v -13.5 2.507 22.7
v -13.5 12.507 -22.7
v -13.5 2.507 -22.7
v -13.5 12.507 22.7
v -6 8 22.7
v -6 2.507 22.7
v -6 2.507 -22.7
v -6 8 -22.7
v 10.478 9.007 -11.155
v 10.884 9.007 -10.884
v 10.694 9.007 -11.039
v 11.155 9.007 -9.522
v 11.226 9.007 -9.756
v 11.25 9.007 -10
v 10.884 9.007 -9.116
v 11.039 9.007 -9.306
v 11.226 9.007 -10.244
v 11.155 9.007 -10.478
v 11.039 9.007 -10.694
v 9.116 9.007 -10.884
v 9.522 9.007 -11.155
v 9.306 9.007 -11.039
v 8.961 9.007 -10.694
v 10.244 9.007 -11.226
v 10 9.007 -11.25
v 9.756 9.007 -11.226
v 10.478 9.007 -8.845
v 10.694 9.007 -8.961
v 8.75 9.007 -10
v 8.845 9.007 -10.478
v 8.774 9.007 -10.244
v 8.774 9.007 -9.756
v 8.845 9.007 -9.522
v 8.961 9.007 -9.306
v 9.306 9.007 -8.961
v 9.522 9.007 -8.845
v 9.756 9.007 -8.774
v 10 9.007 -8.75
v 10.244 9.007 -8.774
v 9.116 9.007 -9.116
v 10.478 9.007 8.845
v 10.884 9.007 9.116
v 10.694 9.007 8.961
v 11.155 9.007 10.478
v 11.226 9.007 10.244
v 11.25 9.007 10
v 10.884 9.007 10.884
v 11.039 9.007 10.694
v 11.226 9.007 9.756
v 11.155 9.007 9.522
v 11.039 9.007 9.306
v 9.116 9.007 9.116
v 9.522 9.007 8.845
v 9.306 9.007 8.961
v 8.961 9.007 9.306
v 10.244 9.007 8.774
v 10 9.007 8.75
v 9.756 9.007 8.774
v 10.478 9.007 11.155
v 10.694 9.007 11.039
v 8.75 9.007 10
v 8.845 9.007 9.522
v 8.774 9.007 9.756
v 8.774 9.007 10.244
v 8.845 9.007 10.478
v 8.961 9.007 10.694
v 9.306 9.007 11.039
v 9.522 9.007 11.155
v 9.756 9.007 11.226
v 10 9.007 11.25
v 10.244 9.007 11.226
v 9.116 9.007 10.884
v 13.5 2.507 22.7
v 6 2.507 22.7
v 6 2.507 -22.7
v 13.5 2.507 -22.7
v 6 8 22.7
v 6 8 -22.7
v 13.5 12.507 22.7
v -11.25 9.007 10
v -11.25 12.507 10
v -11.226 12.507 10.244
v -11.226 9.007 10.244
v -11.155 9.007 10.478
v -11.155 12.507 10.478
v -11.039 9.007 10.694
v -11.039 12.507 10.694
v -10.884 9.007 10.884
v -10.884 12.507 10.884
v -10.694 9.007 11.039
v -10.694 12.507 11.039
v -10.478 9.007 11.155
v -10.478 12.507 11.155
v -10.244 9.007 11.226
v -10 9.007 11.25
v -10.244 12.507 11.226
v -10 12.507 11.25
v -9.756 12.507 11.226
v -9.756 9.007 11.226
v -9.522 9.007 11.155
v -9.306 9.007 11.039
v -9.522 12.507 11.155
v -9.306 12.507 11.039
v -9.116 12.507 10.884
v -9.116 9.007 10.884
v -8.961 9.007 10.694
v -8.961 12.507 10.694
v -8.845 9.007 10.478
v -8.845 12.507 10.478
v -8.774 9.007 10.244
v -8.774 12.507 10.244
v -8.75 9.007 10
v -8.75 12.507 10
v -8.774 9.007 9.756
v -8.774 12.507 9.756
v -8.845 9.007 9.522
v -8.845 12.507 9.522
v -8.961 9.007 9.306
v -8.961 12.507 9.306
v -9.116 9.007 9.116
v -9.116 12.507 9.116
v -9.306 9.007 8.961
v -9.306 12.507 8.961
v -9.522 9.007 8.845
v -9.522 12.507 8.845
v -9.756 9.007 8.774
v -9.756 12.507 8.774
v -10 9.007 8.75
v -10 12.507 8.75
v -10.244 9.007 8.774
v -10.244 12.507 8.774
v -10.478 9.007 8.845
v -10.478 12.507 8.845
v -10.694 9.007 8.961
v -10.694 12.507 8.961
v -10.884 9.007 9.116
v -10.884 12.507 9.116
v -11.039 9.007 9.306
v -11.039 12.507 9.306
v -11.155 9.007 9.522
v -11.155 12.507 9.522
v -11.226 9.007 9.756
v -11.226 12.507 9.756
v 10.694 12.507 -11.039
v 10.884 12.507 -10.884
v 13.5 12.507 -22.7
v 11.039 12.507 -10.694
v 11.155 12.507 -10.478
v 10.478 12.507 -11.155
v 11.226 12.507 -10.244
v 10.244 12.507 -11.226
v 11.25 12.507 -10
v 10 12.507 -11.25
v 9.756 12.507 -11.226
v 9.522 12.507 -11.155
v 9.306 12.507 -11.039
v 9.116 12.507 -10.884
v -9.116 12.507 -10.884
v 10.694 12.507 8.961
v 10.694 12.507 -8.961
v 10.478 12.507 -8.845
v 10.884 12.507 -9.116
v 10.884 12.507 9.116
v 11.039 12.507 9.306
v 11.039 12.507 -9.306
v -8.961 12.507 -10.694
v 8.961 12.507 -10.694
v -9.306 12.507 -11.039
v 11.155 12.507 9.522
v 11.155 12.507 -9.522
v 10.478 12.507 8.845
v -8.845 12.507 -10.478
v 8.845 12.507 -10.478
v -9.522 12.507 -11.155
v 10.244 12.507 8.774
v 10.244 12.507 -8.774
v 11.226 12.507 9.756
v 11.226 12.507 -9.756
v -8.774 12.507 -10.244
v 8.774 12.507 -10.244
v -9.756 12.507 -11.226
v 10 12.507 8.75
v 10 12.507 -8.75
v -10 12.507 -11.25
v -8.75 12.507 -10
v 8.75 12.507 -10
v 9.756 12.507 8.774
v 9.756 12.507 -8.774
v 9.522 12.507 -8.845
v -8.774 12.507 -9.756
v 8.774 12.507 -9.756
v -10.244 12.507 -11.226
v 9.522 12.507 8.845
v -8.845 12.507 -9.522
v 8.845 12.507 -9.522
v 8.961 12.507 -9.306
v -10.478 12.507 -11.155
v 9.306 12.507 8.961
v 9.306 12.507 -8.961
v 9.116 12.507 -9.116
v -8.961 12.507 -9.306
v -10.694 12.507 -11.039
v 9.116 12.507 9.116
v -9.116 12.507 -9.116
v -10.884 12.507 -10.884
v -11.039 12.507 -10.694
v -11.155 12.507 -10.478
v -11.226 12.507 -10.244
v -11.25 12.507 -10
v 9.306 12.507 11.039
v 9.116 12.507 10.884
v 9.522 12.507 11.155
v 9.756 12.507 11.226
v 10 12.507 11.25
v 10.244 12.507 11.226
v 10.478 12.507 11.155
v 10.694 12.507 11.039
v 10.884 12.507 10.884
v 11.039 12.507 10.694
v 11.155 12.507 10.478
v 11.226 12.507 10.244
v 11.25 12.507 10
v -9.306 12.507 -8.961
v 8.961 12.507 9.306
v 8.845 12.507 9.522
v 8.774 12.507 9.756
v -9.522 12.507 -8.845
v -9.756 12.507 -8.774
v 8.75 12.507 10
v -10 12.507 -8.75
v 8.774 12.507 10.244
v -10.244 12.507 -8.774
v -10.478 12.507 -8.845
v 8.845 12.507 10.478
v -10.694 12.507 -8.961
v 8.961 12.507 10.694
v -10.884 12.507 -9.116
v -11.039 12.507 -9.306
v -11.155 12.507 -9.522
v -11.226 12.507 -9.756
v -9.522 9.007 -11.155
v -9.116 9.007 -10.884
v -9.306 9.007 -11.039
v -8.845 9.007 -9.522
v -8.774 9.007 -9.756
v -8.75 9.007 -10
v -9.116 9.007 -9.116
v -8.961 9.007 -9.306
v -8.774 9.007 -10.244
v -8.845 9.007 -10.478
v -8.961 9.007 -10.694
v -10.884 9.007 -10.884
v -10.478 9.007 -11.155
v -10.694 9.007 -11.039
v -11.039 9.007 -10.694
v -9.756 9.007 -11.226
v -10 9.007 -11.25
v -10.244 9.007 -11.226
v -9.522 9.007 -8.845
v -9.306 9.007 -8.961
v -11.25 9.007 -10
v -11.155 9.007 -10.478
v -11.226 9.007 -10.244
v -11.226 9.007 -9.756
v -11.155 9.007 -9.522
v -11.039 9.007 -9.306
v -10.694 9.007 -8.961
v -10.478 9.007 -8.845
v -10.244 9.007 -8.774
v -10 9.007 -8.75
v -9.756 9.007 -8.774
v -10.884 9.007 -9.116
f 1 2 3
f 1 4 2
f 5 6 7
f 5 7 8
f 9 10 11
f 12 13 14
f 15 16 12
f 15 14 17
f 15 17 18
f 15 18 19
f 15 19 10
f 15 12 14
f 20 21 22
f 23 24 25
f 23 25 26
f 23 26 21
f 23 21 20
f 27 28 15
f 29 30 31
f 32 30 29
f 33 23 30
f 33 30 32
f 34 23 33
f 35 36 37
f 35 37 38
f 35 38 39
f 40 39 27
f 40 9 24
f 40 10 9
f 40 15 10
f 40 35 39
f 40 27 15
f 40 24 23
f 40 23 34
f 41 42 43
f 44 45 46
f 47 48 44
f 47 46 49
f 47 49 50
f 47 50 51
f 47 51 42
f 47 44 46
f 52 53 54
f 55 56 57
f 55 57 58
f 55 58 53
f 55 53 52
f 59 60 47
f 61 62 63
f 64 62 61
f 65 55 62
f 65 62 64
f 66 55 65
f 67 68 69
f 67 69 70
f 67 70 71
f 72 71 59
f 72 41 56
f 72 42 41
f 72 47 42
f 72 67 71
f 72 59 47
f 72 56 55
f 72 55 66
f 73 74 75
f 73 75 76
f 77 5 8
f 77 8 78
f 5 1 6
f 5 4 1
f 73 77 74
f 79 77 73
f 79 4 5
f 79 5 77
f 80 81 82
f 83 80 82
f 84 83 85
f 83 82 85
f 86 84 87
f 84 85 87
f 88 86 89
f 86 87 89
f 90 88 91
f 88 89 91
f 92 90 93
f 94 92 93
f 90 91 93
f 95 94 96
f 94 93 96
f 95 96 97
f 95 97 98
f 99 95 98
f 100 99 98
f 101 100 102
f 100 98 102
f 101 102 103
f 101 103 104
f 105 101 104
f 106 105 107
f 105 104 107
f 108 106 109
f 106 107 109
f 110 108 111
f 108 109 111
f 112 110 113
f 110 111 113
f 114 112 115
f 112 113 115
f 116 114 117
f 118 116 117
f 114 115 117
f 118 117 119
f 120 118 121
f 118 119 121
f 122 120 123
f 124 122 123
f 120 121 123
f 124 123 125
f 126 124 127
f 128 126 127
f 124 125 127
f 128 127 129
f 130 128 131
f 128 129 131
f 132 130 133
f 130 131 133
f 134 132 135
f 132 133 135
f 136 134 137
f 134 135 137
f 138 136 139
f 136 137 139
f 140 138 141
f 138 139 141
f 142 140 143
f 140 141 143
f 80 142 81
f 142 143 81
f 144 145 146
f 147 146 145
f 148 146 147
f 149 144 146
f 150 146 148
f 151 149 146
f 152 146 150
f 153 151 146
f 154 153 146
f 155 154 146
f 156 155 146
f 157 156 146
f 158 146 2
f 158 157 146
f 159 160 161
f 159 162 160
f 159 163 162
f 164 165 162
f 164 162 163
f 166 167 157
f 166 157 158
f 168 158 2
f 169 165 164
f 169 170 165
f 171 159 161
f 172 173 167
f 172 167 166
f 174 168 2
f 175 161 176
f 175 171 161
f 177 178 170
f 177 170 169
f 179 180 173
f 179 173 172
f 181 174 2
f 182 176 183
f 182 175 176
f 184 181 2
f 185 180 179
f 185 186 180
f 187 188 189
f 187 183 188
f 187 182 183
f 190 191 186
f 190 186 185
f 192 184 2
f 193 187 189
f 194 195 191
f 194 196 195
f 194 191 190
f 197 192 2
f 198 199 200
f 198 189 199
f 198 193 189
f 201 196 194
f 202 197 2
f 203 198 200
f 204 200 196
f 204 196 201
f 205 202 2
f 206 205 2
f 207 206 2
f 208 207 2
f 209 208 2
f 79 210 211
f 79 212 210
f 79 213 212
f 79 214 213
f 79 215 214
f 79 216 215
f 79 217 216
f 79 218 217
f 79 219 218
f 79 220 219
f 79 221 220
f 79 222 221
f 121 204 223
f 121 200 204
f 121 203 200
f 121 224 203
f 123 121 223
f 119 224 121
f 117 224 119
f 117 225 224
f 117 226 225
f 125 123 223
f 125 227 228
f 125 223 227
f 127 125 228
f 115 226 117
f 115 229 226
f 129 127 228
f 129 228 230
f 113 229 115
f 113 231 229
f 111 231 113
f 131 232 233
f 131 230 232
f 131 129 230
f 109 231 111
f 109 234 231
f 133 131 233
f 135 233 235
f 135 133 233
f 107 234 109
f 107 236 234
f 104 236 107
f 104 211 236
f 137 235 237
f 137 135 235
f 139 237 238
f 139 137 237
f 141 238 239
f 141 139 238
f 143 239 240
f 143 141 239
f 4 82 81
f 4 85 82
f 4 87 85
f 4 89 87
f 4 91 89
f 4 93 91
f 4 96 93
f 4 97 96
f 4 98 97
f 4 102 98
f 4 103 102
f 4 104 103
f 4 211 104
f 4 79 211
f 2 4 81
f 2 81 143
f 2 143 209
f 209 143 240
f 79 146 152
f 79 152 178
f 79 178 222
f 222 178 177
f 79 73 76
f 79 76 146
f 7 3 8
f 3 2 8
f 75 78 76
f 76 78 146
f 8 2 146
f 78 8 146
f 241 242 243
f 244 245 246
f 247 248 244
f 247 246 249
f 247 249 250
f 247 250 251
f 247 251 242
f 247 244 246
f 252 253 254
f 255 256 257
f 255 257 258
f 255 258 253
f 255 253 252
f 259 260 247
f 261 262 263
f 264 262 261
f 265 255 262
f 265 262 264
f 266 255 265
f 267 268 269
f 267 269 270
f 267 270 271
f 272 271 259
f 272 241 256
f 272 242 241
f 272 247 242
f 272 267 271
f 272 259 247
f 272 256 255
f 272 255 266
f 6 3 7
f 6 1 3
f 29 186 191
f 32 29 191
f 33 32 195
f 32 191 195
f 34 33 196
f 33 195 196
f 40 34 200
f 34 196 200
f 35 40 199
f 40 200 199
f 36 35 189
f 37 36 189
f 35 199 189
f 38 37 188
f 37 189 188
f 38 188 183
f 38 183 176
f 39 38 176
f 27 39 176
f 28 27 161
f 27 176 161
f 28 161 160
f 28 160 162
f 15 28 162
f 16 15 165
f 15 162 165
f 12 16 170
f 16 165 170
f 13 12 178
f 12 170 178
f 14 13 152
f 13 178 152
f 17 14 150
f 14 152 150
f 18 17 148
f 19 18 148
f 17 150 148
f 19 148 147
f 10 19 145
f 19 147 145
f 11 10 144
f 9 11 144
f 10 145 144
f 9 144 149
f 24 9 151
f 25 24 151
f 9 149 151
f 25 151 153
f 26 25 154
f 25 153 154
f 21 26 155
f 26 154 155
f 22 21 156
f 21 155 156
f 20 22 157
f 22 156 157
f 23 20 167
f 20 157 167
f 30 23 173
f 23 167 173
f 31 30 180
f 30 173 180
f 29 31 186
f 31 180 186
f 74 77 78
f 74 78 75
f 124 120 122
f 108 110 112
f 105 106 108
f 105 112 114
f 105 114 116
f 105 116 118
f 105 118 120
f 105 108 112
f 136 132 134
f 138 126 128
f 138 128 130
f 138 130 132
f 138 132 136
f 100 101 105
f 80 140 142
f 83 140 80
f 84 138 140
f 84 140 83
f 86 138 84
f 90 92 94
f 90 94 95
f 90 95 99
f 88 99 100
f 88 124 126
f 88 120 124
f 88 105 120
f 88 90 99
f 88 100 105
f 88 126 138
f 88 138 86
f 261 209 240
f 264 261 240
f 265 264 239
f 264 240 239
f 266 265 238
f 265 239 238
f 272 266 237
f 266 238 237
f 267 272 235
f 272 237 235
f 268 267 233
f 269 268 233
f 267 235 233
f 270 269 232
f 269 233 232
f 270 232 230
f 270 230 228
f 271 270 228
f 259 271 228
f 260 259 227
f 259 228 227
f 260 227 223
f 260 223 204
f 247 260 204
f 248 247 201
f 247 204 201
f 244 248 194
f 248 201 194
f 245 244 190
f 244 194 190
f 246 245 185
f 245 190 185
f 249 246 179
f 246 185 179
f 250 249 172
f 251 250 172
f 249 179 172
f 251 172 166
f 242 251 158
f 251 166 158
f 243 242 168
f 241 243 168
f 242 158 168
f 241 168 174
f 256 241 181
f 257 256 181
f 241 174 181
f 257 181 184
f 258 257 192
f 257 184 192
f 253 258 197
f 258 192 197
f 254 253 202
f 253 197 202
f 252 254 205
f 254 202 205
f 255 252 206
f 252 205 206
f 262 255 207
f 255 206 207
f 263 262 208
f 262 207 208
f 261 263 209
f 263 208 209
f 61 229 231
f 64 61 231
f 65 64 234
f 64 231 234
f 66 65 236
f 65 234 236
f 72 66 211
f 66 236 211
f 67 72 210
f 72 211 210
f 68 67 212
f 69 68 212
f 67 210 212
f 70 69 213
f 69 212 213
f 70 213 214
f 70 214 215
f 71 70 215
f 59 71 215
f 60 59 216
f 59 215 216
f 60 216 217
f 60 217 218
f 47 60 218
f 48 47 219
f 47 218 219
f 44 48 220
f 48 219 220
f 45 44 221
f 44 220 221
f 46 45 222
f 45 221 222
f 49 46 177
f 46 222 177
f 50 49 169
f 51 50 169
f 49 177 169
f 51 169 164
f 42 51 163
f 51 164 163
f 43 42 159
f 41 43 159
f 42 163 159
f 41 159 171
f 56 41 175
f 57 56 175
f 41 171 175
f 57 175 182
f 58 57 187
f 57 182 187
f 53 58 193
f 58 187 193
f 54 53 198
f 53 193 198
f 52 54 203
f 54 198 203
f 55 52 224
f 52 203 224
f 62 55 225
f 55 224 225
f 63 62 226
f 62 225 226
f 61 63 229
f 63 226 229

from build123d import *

# Parameters (mm, degrees)
BOSS_EXTRUDE1_DEPTH = 22.7
SKETCH2_R           = 1.25
CUT_EXTRUDE1_DEPTH  = 3.5


with BuildPart() as part:
    # Sketch1 → Boss-Extrude1 (new, symmetric)
    with BuildSketch(Plane.XY):
        Polygon((-13.5, 2.506896552), (-6, 2.506896552), (-6, 8), (6, 8), (6, 2.506896552), (13.5, 2.506896552), (13.5, 12.506896552), (-13.5, 12.506896552), align=None)
    extrude(amount=BOSS_EXTRUDE1_DEPTH, both=True)

    # Sketch2 → Cut-Extrude1 (cut)
    with BuildSketch(Plane(origin=(0, 12.506896552, 0), x_dir=(1, 0, 0), z_dir=(0, 1, 0))):
        with Locations(Location((-10, 10, 0), (0, 0, 180))):
            Circle(SKETCH2_R)
        with Locations(Location((10, 10, 0), (0, 0, 180))):
            Circle(SKETCH2_R)
        with Locations(Location((-10, -10, 0), (0, 0, 180))):
            Circle(SKETCH2_R)
        with Locations(Location((10, -10, 0), (0, 0, 180))):
            Circle(SKETCH2_R)
    extrude(amount=-CUT_EXTRUDE1_DEPTH, mode=Mode.SUBTRACT)


solid = part.part
